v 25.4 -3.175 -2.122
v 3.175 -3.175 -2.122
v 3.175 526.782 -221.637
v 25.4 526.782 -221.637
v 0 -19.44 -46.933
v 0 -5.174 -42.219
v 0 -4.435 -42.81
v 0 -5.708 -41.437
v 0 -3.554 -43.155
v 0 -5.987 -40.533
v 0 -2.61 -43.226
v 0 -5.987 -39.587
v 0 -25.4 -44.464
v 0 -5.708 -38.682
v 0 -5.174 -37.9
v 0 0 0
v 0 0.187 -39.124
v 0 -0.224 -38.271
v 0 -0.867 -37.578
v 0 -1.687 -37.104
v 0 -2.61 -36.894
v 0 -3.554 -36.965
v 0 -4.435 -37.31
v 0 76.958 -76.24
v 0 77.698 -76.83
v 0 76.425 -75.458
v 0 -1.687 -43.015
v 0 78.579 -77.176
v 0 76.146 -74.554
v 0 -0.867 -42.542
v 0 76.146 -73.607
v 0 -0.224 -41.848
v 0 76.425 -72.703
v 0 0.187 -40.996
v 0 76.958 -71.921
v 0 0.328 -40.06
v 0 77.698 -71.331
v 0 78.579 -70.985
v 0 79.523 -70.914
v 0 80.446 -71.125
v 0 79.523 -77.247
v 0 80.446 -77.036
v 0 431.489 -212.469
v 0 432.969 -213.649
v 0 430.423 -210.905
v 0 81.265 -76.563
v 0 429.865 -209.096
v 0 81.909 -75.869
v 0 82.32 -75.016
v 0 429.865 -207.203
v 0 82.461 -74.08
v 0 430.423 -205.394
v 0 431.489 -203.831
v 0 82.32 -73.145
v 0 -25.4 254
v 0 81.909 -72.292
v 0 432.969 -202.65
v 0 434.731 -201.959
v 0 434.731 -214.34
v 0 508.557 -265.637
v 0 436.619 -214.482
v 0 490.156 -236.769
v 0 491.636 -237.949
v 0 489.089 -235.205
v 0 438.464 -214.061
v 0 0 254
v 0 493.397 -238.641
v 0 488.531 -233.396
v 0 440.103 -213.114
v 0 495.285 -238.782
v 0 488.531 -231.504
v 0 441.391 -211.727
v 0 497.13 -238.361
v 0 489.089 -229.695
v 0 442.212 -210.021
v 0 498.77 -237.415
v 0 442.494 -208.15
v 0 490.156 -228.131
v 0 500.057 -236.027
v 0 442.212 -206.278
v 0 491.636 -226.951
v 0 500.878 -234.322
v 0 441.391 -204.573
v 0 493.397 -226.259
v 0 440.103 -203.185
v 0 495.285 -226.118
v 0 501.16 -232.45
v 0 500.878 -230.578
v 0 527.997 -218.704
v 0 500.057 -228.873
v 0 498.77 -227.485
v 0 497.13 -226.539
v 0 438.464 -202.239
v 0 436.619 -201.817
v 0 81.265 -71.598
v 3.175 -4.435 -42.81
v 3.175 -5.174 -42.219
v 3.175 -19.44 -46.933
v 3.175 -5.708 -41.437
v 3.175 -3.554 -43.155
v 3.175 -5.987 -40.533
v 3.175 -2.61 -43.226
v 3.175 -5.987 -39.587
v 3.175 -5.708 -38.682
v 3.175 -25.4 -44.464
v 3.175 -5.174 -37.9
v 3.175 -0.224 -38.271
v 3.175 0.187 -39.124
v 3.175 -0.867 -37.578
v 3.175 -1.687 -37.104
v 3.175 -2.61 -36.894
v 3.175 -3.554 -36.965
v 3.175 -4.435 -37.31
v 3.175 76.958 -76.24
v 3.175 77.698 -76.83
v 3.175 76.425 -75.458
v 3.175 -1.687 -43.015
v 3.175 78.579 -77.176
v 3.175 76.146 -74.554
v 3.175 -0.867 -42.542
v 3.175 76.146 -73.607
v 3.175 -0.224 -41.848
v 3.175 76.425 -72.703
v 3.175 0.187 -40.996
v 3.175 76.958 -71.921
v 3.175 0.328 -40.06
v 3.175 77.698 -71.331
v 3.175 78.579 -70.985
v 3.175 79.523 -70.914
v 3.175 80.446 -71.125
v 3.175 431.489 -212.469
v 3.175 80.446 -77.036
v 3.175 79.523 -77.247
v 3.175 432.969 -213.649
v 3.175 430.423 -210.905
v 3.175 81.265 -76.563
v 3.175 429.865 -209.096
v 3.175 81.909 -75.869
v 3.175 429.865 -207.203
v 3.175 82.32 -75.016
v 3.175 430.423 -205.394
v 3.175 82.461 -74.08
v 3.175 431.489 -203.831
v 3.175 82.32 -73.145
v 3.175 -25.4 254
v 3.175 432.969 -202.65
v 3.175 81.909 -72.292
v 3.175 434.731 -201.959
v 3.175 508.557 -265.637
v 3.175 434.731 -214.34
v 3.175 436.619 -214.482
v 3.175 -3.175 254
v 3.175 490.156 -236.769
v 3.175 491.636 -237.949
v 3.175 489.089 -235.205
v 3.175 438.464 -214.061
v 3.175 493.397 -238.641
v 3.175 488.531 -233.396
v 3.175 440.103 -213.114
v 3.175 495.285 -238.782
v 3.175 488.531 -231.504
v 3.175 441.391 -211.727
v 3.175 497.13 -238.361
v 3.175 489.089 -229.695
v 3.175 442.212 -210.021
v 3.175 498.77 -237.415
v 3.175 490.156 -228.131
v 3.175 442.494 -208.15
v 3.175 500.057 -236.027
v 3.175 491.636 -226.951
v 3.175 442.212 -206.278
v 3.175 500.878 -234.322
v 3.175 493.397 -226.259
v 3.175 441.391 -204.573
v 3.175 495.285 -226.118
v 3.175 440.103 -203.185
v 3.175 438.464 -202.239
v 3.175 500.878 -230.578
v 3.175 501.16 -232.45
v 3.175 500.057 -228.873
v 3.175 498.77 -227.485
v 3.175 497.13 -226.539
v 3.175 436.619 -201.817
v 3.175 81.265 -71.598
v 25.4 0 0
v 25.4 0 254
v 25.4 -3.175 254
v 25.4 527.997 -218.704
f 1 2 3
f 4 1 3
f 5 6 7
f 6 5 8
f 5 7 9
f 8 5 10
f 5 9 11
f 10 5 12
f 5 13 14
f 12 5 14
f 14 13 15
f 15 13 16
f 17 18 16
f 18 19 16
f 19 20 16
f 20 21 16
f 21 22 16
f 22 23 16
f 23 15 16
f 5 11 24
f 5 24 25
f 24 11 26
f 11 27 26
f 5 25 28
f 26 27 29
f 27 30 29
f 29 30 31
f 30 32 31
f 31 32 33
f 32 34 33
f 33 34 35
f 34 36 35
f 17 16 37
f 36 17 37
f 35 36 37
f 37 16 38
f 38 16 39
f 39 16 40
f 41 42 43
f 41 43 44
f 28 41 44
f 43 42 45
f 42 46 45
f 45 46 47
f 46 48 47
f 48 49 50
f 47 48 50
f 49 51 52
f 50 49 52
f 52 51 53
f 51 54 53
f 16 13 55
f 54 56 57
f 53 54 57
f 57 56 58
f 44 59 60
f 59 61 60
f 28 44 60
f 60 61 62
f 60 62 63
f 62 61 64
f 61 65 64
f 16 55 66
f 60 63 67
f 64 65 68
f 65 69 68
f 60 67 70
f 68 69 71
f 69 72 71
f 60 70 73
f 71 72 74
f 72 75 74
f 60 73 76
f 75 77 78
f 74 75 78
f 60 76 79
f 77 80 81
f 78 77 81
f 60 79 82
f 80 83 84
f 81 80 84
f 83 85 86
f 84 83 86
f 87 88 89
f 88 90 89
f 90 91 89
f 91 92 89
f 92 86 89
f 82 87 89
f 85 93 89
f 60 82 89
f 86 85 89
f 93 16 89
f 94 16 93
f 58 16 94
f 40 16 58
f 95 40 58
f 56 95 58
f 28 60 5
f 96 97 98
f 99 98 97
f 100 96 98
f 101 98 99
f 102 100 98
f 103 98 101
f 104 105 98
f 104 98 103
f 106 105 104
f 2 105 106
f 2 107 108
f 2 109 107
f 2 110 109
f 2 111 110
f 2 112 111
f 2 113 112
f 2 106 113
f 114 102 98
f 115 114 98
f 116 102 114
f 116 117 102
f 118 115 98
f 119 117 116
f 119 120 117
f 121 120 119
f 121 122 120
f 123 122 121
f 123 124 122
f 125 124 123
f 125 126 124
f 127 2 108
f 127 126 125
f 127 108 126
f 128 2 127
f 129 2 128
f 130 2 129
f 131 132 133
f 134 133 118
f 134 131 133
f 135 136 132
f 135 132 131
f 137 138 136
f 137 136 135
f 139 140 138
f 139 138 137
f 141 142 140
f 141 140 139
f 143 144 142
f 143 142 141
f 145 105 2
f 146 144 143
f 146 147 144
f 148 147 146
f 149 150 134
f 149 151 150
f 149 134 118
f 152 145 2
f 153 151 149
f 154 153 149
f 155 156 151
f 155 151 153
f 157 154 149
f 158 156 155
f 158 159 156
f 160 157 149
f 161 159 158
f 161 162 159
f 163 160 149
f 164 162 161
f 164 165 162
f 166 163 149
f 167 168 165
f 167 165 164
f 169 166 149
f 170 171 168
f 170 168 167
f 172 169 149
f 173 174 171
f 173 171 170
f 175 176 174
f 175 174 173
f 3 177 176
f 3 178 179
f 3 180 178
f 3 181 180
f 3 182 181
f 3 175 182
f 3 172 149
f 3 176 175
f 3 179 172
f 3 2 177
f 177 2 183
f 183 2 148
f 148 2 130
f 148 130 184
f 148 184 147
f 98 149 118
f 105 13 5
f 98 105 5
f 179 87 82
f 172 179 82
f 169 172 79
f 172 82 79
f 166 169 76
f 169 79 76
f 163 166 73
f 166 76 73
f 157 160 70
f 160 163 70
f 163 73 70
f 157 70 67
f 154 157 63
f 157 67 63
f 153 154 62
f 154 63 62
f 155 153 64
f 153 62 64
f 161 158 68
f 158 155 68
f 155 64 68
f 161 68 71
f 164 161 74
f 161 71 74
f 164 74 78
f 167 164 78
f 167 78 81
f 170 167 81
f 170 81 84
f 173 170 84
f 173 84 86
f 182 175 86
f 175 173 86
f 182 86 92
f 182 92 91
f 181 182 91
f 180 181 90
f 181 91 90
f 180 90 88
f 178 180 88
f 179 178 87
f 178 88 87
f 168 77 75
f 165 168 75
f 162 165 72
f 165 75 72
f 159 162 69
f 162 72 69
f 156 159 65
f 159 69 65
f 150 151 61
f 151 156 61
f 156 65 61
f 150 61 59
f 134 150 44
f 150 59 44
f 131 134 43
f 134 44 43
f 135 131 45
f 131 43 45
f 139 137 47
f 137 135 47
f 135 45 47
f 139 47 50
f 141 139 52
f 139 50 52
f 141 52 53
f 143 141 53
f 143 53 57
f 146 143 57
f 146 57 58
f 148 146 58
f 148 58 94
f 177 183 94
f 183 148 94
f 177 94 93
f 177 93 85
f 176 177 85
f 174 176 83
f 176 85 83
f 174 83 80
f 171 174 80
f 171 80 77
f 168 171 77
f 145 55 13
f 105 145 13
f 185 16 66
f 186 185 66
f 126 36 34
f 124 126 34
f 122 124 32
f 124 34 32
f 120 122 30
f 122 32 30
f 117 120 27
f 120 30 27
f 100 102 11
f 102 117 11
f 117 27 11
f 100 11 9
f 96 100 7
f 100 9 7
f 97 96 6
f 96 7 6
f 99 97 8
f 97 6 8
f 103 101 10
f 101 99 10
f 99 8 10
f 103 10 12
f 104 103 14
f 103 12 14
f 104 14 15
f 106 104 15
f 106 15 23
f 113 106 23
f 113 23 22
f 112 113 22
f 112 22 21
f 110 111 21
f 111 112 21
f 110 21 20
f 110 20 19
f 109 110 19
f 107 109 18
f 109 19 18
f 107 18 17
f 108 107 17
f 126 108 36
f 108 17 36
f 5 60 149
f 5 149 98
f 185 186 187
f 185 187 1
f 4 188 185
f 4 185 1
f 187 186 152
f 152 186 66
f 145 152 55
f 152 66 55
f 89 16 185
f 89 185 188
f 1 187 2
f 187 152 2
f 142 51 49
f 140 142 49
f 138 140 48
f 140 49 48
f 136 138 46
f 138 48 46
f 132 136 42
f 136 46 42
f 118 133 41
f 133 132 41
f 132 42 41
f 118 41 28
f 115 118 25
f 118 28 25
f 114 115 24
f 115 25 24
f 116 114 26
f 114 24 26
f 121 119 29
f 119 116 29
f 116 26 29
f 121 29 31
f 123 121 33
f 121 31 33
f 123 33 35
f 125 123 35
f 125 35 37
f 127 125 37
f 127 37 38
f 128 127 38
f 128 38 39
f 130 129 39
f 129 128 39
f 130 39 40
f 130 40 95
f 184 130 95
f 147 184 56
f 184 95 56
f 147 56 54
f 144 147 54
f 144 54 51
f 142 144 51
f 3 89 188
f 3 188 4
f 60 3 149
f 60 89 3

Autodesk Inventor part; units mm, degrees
ref_plane "YZ Plane" through (0, 0, 0) normal (1, 0, 0) x (0, 1, 0)
ref_plane "XZ Plane" through (0, 0, 0) normal (0, 1, 0) x (-1, 0, 0)
ref_plane "XY Plane" through (0, 0, 0) normal (0, 0, 1) x (1, 0, 0)
sketch "Sketch1" plane through (0, 0, 0) normal (1, 0, 0) x (0, 1, 0)
  line L0 (0, 0) -> (0, 254)
  line L1 (0, 0) -> (254, 0) construction
  line L2 (0, 0) -> (527.9972, -218.7036)
  line L3 (0, 0) -> (571.5, 0) construction
  line L4 (0, 254) -> (-25.4, 254)
  line L5 (0, 254) -> (25.4, 254) construction
  line L6 (527.9972, -218.7036) -> (508.5568, -265.6367)
  line L7 (527.9972, -218.7036) -> (578.7972, -218.7036) construction
  line L8 (508.5568, -265.6367) -> (-19.4403, -46.9331)
  line L9 (-19.4403, -46.9331) -> (-6.7403, -46.9331) construction
  line L10 (-25.4, 254) -> (-25.4, -44.4645)
  line L11 (-25.4, 254) -> (273.0645, 254) construction
  line L12 (-25.4, -44.4645) -> (-19.4403, -46.9331)
  line L13 (518.277, -242.1701) -> (543.677, -242.1701) construction
  circle A0 centre (494.8105, -232.45) radius 6.35
  circle A1 centre (436.1441, -208.1496) radius 6.35
  line L14 (-19.4403, -46.9331) -> (-14.5802, -35.1998)
  line L15 (126.219, -93.5208) -> (121.3589, -105.254)
  line L16 (-14.5802, -35.1998) -> (-1.8802, -35.1998) construction
  line L17 (-2.847, -40.0599) -> (86.053, -40.0599) construction
  circle A2 centre (79.2859, -74.0804) radius 3.175
  circle A3 centre (-2.847, -40.0599) radius 3.175
  dimension "d0" = 254
  dimension "d1" = 90
  dimension "d2" = 571.5
  dimension "d3" = 22.5
  dimension "d4" = 25.4
  dimension "d5" = 180
  dimension "d6" = 50.8
  dimension "d7" = 112.5
  dimension "d8" = 571.5
  dimension "d9" = 90
  dimension "d12" = 90
  dimension "d17" = 12.7
  dimension "d18" = 12.7
  dimension "d19" = 12.7
  dimension "d20" = 152.4
  dimension "d22" = 12.7
  dimension "d26" = 6.35
  dimension "d27" = 6.35
extrude "Extrusion1" add sketch "Sketch1" along normal blind 3.175
sketch "Sketch2" plane through (3.175, 0, 0) normal (1, 0, 0) x (0, 0, -1)
  line L0 (0, 0) -> (-254, 0) projected
  line L1 (265.6367, 508.5568) -> (218.7036, 527.9972) projected
  line L2 (218.7036, 527.9972) -> (0, 0) projected
  line L3 (218.7036, 527.9972) -> (221.6369, 526.7821)
  line L4 (218.7036, 527.9972) -> (221.8786, 527.9972) construction
  line L5 (-254, 0) -> (-254, -3.175)
  line L6 (-254, 0) -> (-250.825, 0) construction
  line L7 (-254, -3.175) -> (2.1215, -3.175)
  line L8 (2.1215, -3.175) -> (221.6369, 526.7821)
  dimension "d30" = 3.175
  dimension "d31" = 22.5
  dimension "d33" = 3.175
  dimension "d34" = 90
  dimension "d35" = 90
extrude "Extrusion2" add sketch "Sketch2" along normal blind 22.225
properties part number "CatapultArmZ-Left"
